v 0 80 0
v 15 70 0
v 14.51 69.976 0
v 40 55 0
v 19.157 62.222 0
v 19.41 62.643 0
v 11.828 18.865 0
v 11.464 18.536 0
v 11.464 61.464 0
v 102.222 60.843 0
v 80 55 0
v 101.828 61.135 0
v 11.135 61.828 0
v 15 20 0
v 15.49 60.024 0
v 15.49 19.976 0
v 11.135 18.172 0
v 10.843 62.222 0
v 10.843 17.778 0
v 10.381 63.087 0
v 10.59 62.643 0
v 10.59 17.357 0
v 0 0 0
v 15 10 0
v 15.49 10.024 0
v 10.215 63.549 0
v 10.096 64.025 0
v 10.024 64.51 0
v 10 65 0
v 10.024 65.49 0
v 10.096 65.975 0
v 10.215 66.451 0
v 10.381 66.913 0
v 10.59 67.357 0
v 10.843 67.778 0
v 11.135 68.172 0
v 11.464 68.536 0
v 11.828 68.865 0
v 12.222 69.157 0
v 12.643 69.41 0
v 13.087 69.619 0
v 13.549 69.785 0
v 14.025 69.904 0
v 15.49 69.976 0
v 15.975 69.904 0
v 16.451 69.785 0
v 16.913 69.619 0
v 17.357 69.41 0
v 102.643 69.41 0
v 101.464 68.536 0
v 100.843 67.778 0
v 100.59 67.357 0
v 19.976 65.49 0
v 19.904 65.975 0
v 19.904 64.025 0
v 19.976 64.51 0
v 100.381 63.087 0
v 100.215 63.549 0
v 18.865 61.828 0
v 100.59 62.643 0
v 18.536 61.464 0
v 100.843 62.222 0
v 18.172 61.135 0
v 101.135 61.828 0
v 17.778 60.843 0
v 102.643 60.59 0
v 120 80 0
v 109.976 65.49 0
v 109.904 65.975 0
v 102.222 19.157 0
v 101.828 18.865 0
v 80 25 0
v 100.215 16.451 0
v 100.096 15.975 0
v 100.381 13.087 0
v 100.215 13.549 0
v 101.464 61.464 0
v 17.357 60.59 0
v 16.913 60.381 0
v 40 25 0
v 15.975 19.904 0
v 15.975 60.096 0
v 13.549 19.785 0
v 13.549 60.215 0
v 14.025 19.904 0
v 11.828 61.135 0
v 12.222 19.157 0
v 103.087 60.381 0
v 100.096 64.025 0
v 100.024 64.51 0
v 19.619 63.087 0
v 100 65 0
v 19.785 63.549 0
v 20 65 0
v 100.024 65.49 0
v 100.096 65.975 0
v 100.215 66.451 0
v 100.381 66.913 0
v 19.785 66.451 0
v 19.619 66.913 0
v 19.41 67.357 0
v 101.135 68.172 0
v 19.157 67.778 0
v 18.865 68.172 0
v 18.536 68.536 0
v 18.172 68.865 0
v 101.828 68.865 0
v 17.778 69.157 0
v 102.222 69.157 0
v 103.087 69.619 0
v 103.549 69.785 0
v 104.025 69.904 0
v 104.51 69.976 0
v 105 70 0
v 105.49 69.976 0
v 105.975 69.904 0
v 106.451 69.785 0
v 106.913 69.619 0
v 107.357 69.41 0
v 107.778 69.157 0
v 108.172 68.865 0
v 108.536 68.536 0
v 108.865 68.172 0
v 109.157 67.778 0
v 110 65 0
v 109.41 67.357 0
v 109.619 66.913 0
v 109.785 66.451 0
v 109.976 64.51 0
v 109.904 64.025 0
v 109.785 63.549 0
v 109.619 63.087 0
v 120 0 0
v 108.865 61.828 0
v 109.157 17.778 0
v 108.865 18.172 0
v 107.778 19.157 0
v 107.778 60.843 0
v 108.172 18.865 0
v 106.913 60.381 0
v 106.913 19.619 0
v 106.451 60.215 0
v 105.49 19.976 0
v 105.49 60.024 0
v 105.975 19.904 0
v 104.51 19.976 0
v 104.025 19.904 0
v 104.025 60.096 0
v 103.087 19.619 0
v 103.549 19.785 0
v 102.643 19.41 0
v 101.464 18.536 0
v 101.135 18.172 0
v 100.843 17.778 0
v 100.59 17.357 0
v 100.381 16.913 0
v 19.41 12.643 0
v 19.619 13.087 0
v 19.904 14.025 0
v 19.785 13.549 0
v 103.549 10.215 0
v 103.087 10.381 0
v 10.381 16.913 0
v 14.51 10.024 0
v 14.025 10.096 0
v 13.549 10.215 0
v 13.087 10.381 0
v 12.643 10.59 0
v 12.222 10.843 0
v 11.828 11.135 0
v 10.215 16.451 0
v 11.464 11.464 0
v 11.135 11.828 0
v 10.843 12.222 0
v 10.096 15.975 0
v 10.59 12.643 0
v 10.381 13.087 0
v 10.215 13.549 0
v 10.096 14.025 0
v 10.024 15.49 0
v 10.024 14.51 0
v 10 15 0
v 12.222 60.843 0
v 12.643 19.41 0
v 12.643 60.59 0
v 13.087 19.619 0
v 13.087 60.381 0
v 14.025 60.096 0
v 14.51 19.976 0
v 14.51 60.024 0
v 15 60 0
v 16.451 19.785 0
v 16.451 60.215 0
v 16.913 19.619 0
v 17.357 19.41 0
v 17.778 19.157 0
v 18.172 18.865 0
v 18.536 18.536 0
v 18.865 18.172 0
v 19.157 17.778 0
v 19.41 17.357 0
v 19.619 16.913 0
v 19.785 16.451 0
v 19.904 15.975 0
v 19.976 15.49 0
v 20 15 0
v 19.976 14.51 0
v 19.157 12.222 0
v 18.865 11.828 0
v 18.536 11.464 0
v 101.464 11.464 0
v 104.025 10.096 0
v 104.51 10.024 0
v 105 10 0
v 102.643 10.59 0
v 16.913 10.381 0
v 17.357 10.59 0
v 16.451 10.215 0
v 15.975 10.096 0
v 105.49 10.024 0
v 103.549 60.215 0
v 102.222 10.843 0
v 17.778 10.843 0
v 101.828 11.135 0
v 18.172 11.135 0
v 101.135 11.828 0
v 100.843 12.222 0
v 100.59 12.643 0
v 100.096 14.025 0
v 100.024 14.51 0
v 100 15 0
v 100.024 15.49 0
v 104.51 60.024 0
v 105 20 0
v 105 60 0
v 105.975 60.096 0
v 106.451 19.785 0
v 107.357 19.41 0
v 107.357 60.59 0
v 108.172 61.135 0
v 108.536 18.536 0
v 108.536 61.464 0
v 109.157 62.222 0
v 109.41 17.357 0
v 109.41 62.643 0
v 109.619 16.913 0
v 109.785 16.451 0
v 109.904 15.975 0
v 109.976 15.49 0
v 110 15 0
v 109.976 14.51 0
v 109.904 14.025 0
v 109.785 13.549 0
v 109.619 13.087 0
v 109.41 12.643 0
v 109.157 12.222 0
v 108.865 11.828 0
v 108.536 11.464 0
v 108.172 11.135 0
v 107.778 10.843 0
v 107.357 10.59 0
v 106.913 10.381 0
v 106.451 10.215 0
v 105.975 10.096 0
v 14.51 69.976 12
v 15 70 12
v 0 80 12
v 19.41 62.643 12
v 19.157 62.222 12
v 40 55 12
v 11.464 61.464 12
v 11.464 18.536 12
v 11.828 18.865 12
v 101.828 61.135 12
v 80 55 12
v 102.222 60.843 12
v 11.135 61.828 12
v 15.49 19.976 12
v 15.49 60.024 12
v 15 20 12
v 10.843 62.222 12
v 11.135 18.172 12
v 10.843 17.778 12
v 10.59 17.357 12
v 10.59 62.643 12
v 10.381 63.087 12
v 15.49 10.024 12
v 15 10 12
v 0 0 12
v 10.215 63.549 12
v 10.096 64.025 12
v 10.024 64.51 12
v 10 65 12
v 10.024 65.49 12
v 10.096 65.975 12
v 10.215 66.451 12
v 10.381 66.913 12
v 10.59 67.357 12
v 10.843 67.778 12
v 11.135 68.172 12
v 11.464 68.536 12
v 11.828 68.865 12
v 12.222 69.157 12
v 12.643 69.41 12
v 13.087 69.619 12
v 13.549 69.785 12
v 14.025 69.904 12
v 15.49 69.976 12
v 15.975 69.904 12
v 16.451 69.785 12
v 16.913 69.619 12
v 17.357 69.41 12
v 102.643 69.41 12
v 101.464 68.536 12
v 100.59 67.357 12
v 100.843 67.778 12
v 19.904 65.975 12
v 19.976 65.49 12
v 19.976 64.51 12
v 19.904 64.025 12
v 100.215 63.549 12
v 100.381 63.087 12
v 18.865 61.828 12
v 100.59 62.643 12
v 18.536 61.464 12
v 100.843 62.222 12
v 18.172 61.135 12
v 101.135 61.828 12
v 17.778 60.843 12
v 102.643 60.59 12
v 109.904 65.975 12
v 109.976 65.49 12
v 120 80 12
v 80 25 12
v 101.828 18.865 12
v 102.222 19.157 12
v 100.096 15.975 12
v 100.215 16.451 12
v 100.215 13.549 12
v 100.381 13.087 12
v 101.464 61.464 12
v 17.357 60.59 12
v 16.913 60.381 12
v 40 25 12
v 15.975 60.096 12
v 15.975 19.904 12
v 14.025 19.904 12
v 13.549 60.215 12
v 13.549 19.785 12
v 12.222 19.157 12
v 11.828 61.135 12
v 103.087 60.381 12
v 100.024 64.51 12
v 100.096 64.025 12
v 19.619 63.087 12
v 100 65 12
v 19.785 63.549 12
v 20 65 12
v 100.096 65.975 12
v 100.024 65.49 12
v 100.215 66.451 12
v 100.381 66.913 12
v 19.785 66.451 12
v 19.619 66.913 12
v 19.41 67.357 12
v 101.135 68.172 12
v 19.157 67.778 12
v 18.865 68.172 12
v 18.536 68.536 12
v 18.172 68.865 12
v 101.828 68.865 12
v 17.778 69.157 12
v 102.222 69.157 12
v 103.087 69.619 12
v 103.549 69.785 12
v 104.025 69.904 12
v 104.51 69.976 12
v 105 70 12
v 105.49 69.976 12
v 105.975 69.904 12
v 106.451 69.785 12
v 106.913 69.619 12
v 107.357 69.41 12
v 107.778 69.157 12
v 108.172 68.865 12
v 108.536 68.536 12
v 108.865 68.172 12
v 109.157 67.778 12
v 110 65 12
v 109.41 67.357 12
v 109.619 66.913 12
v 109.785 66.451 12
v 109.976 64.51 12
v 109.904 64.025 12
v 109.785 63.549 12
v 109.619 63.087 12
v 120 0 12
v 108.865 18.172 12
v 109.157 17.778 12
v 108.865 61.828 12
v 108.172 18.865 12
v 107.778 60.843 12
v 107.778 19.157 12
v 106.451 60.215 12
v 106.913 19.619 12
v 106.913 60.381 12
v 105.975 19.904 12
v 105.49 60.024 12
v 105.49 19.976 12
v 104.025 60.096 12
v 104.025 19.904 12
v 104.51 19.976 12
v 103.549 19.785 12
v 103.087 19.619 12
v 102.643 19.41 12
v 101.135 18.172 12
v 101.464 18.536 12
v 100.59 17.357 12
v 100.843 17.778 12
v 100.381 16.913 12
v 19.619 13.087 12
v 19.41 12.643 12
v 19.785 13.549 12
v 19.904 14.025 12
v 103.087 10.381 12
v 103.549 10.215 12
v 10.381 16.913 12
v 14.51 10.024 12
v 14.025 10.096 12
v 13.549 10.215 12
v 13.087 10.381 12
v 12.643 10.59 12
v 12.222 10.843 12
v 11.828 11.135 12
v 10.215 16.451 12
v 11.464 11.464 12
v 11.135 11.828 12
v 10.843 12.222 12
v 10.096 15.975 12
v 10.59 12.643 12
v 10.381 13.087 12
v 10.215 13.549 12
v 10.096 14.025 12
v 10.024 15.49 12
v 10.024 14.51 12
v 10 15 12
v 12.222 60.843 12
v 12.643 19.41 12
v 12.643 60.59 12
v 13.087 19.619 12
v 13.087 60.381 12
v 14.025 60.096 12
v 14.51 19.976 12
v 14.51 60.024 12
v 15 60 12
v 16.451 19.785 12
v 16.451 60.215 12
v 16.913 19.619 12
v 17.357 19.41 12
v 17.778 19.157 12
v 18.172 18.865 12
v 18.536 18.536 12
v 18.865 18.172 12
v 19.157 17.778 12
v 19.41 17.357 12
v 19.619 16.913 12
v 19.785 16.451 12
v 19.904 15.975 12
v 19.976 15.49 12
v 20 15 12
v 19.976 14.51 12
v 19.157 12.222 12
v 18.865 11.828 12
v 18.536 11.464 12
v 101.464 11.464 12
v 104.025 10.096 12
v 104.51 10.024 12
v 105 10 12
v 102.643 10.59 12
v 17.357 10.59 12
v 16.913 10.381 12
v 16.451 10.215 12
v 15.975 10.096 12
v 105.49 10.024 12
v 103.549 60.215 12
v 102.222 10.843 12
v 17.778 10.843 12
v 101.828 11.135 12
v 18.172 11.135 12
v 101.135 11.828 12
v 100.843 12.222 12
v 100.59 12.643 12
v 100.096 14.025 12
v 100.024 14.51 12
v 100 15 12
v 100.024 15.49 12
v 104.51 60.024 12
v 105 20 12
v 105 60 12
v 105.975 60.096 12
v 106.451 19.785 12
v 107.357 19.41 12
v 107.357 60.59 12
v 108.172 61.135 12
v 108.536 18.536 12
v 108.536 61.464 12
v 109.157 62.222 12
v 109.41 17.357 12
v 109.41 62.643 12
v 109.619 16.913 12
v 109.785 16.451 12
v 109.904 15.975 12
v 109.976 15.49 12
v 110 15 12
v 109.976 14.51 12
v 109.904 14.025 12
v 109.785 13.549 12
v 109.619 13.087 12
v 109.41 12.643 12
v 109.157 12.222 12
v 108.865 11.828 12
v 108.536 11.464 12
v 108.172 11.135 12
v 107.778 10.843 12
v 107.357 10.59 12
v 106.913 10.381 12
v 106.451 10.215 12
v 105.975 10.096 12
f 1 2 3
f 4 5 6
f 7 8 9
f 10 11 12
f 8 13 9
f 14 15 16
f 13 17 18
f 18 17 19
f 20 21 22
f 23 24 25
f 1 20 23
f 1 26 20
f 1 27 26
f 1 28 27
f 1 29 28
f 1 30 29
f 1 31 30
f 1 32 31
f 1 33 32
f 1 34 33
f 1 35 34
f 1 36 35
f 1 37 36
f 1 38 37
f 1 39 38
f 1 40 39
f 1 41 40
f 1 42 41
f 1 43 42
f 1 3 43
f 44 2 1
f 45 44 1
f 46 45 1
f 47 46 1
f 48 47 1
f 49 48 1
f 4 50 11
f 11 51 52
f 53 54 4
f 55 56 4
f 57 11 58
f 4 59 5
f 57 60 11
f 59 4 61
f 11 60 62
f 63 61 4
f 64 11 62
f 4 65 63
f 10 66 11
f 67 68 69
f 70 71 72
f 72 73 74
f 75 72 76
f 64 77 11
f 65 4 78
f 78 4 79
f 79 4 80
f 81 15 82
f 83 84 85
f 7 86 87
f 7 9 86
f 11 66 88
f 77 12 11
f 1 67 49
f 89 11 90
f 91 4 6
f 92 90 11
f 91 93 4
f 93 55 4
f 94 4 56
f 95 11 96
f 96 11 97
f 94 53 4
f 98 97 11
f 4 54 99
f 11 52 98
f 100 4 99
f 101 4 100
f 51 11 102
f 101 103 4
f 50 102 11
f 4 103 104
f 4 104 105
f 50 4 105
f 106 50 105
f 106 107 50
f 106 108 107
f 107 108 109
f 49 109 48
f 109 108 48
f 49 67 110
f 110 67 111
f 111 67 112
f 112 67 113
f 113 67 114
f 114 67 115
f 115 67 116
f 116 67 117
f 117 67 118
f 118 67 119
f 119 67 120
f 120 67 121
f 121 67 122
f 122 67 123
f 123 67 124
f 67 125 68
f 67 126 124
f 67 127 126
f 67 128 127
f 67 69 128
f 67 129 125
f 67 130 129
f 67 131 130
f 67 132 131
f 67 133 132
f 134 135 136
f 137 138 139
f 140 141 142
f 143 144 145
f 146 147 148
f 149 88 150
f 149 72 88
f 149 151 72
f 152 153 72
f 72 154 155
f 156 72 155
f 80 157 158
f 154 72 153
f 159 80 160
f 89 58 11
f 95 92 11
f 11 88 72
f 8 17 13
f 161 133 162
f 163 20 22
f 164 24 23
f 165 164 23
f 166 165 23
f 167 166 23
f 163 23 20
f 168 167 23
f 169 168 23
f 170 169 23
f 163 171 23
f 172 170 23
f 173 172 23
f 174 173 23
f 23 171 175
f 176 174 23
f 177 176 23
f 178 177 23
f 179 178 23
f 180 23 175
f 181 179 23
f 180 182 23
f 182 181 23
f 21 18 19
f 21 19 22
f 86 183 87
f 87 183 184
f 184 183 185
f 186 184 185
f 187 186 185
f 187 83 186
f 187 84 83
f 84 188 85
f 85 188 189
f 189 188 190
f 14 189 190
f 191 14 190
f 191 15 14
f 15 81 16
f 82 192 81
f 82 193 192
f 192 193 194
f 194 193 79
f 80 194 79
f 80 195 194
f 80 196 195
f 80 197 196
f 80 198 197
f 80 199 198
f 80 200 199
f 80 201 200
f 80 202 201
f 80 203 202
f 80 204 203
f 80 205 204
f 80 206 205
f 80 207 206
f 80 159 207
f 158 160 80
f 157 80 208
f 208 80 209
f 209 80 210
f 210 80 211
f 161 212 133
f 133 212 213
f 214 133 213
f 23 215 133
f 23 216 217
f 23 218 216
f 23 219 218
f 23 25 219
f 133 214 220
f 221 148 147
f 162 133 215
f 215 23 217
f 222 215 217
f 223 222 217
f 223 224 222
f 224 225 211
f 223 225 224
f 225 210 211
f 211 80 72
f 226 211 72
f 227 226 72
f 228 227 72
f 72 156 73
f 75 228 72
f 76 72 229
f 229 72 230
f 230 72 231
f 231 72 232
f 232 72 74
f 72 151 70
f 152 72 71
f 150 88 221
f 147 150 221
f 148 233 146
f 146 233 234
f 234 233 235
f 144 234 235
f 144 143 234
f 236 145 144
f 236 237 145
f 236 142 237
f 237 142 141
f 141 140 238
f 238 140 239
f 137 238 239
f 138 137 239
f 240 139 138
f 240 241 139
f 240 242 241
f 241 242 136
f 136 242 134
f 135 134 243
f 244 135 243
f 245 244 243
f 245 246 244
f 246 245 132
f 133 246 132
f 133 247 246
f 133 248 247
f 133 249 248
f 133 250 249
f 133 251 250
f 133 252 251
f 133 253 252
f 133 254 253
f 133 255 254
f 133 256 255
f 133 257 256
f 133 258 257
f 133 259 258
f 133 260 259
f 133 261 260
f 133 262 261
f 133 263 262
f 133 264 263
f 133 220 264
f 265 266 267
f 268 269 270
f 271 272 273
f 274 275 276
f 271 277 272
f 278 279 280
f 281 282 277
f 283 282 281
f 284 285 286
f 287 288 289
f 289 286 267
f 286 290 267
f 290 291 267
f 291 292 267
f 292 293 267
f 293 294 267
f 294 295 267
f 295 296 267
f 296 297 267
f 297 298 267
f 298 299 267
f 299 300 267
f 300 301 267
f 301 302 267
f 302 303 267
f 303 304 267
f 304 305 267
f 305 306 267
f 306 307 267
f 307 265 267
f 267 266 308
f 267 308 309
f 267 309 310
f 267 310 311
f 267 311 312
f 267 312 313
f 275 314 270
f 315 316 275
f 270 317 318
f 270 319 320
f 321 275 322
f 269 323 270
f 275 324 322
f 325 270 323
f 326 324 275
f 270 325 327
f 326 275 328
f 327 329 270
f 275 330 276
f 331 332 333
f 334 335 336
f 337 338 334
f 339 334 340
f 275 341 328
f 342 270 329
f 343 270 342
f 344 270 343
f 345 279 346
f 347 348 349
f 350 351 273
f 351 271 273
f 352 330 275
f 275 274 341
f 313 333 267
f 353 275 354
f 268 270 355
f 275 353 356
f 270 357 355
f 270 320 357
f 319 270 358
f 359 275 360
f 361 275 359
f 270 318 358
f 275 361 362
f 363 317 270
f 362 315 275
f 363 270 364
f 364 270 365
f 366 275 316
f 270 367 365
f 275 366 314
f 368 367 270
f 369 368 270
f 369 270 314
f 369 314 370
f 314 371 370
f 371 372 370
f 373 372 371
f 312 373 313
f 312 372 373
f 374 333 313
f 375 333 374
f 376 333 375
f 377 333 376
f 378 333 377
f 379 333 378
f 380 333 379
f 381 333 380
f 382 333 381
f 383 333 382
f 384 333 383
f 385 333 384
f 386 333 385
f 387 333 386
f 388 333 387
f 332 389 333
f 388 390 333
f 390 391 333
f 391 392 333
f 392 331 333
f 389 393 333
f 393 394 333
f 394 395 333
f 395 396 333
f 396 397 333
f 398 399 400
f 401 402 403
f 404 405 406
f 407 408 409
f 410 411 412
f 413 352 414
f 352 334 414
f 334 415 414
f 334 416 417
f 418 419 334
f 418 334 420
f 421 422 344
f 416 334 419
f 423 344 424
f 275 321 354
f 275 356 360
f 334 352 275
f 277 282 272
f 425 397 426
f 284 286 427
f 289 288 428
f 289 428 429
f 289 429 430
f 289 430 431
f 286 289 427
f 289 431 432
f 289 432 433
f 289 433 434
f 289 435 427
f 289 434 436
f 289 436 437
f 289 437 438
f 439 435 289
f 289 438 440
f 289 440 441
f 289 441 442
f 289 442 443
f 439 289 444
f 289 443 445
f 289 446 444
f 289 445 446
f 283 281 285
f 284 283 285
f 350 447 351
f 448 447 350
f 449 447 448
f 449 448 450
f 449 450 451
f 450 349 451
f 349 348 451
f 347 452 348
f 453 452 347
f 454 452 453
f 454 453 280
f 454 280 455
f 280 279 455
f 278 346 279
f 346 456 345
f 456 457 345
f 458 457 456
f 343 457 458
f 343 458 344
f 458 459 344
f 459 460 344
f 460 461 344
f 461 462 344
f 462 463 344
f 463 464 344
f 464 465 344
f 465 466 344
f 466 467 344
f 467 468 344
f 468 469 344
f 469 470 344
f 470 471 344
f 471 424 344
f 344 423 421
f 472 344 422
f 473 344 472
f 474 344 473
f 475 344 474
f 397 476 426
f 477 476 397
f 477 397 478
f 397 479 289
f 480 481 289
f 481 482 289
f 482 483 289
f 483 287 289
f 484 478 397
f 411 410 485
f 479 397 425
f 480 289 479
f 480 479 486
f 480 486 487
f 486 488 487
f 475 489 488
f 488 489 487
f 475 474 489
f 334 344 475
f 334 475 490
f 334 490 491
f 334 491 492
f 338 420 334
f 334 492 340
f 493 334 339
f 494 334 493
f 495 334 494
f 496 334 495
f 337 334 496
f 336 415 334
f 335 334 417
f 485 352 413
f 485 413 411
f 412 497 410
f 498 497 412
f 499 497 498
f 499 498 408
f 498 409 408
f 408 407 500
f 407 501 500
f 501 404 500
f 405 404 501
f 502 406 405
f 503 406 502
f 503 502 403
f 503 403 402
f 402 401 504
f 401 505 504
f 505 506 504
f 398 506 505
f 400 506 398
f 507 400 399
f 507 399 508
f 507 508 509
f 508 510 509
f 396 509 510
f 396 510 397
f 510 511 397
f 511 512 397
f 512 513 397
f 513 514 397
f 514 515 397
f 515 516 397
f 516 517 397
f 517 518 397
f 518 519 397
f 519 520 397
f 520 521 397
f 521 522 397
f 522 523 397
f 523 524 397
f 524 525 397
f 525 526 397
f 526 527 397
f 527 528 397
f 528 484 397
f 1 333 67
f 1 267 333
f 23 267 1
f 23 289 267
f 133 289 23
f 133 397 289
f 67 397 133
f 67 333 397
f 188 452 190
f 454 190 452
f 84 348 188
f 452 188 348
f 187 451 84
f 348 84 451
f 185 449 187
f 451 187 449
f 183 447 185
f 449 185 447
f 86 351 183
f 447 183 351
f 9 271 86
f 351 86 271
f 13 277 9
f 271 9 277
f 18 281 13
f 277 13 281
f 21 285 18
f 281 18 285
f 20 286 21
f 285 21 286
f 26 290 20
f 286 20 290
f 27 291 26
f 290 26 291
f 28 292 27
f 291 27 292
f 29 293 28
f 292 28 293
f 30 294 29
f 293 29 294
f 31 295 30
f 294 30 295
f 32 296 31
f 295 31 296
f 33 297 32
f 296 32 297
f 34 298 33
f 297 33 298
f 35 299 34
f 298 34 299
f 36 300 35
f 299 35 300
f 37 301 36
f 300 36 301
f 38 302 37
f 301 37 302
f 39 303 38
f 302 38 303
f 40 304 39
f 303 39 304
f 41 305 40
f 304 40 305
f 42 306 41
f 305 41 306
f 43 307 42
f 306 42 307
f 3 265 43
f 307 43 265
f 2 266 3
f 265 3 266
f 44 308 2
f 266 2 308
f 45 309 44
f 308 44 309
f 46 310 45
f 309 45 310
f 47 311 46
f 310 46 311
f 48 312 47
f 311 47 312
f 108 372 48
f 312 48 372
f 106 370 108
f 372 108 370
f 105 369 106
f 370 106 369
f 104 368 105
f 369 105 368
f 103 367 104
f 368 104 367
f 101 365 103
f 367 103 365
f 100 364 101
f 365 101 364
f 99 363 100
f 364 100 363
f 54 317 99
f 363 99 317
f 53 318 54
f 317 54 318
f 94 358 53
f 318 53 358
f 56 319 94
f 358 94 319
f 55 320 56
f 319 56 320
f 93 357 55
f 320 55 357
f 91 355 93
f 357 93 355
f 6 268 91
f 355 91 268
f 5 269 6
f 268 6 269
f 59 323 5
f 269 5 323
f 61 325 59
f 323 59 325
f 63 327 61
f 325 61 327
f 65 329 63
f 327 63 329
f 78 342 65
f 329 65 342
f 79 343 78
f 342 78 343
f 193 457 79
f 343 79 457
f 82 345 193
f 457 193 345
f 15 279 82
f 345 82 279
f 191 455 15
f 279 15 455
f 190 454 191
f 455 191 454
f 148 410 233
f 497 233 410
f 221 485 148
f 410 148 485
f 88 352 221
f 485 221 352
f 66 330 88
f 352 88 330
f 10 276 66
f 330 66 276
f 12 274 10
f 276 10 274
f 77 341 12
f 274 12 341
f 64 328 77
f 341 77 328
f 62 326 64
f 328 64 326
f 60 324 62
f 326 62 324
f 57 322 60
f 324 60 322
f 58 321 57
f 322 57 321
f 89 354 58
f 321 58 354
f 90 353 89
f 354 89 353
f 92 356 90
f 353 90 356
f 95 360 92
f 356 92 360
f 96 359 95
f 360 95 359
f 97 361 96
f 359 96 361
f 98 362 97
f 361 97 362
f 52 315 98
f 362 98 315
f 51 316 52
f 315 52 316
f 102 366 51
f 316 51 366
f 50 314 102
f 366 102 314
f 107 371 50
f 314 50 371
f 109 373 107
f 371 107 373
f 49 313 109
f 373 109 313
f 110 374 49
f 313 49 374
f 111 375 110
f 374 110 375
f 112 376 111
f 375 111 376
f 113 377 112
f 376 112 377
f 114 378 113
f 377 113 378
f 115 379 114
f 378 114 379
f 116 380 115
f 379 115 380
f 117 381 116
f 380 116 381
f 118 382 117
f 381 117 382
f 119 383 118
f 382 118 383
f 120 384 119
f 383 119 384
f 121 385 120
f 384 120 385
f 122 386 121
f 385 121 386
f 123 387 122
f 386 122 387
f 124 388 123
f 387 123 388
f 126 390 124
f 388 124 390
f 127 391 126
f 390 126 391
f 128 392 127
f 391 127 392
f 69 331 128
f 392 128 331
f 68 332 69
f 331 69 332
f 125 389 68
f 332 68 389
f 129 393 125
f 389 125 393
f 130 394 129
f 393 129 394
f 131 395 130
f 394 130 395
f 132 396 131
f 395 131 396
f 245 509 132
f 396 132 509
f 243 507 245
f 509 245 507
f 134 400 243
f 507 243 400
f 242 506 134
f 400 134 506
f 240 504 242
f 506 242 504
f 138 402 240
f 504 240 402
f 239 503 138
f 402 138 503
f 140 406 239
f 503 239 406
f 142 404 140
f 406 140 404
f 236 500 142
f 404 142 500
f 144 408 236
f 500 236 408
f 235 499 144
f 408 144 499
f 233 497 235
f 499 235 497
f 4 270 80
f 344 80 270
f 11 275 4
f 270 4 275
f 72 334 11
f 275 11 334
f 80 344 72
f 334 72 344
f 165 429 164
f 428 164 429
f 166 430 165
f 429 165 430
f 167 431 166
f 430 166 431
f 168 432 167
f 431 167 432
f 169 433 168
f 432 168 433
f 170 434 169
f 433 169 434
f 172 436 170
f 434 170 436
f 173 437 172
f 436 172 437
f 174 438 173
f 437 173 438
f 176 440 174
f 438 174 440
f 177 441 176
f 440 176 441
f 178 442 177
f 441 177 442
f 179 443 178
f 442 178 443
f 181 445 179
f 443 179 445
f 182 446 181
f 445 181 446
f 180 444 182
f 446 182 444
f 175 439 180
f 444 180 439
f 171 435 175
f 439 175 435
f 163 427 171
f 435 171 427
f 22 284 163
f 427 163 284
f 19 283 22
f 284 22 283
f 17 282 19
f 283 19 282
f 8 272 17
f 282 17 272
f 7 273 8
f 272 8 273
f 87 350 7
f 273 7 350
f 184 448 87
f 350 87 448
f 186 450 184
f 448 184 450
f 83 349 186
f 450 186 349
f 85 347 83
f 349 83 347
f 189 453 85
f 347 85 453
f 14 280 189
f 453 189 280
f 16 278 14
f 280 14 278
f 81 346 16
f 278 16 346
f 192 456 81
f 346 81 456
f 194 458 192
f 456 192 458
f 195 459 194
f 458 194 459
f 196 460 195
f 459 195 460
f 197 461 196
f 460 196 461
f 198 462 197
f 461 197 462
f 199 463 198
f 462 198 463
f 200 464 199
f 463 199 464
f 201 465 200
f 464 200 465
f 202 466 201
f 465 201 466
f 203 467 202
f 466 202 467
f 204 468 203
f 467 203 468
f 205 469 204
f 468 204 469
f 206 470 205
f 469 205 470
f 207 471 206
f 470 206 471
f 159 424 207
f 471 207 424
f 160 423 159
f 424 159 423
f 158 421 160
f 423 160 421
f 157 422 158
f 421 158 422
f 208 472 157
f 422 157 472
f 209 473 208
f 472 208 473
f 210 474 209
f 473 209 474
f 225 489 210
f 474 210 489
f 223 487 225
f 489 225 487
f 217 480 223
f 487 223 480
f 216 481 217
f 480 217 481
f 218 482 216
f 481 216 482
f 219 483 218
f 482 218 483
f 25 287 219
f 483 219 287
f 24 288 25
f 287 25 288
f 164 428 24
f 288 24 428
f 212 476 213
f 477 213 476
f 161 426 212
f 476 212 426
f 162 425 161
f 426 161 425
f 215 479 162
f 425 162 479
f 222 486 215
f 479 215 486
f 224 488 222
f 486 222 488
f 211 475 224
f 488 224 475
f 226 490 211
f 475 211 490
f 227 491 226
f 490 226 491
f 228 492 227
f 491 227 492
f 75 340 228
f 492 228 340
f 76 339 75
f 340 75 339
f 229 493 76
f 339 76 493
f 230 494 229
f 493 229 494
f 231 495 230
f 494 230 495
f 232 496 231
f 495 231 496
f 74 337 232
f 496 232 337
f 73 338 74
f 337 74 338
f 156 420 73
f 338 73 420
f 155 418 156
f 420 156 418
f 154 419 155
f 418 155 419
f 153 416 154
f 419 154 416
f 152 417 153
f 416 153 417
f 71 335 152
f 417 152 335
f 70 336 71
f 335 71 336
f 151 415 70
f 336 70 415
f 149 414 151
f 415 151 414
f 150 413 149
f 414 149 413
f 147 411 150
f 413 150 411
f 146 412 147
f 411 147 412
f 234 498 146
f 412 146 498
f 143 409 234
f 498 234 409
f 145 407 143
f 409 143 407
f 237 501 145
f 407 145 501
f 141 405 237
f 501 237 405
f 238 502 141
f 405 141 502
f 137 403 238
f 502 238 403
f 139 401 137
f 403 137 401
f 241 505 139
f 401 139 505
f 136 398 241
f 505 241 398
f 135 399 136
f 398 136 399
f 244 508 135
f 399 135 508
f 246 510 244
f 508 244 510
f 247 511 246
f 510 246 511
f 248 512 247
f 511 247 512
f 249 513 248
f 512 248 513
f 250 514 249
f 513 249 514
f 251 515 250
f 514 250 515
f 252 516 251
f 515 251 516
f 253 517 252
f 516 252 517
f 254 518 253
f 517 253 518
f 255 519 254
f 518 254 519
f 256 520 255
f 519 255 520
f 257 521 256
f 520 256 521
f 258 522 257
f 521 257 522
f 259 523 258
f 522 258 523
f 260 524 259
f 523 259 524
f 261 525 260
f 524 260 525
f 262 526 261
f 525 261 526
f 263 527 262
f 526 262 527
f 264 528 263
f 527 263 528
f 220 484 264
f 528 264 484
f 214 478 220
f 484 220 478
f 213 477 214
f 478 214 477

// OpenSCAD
linear_extrude(height = 12)
  difference() {
    polygon([[0,0],[120,0],[120,80],[0,80]]);
    translate([15,15]) circle(r = 5, $fn = 64);
    translate([105,15]) circle(r = 5, $fn = 64);
    translate([15,65]) circle(r = 5, $fn = 64);
    translate([105,65]) circle(r = 5, $fn = 64);
    polygon([[40,25],[80,25],[80,55],[40,55]]);
  }
